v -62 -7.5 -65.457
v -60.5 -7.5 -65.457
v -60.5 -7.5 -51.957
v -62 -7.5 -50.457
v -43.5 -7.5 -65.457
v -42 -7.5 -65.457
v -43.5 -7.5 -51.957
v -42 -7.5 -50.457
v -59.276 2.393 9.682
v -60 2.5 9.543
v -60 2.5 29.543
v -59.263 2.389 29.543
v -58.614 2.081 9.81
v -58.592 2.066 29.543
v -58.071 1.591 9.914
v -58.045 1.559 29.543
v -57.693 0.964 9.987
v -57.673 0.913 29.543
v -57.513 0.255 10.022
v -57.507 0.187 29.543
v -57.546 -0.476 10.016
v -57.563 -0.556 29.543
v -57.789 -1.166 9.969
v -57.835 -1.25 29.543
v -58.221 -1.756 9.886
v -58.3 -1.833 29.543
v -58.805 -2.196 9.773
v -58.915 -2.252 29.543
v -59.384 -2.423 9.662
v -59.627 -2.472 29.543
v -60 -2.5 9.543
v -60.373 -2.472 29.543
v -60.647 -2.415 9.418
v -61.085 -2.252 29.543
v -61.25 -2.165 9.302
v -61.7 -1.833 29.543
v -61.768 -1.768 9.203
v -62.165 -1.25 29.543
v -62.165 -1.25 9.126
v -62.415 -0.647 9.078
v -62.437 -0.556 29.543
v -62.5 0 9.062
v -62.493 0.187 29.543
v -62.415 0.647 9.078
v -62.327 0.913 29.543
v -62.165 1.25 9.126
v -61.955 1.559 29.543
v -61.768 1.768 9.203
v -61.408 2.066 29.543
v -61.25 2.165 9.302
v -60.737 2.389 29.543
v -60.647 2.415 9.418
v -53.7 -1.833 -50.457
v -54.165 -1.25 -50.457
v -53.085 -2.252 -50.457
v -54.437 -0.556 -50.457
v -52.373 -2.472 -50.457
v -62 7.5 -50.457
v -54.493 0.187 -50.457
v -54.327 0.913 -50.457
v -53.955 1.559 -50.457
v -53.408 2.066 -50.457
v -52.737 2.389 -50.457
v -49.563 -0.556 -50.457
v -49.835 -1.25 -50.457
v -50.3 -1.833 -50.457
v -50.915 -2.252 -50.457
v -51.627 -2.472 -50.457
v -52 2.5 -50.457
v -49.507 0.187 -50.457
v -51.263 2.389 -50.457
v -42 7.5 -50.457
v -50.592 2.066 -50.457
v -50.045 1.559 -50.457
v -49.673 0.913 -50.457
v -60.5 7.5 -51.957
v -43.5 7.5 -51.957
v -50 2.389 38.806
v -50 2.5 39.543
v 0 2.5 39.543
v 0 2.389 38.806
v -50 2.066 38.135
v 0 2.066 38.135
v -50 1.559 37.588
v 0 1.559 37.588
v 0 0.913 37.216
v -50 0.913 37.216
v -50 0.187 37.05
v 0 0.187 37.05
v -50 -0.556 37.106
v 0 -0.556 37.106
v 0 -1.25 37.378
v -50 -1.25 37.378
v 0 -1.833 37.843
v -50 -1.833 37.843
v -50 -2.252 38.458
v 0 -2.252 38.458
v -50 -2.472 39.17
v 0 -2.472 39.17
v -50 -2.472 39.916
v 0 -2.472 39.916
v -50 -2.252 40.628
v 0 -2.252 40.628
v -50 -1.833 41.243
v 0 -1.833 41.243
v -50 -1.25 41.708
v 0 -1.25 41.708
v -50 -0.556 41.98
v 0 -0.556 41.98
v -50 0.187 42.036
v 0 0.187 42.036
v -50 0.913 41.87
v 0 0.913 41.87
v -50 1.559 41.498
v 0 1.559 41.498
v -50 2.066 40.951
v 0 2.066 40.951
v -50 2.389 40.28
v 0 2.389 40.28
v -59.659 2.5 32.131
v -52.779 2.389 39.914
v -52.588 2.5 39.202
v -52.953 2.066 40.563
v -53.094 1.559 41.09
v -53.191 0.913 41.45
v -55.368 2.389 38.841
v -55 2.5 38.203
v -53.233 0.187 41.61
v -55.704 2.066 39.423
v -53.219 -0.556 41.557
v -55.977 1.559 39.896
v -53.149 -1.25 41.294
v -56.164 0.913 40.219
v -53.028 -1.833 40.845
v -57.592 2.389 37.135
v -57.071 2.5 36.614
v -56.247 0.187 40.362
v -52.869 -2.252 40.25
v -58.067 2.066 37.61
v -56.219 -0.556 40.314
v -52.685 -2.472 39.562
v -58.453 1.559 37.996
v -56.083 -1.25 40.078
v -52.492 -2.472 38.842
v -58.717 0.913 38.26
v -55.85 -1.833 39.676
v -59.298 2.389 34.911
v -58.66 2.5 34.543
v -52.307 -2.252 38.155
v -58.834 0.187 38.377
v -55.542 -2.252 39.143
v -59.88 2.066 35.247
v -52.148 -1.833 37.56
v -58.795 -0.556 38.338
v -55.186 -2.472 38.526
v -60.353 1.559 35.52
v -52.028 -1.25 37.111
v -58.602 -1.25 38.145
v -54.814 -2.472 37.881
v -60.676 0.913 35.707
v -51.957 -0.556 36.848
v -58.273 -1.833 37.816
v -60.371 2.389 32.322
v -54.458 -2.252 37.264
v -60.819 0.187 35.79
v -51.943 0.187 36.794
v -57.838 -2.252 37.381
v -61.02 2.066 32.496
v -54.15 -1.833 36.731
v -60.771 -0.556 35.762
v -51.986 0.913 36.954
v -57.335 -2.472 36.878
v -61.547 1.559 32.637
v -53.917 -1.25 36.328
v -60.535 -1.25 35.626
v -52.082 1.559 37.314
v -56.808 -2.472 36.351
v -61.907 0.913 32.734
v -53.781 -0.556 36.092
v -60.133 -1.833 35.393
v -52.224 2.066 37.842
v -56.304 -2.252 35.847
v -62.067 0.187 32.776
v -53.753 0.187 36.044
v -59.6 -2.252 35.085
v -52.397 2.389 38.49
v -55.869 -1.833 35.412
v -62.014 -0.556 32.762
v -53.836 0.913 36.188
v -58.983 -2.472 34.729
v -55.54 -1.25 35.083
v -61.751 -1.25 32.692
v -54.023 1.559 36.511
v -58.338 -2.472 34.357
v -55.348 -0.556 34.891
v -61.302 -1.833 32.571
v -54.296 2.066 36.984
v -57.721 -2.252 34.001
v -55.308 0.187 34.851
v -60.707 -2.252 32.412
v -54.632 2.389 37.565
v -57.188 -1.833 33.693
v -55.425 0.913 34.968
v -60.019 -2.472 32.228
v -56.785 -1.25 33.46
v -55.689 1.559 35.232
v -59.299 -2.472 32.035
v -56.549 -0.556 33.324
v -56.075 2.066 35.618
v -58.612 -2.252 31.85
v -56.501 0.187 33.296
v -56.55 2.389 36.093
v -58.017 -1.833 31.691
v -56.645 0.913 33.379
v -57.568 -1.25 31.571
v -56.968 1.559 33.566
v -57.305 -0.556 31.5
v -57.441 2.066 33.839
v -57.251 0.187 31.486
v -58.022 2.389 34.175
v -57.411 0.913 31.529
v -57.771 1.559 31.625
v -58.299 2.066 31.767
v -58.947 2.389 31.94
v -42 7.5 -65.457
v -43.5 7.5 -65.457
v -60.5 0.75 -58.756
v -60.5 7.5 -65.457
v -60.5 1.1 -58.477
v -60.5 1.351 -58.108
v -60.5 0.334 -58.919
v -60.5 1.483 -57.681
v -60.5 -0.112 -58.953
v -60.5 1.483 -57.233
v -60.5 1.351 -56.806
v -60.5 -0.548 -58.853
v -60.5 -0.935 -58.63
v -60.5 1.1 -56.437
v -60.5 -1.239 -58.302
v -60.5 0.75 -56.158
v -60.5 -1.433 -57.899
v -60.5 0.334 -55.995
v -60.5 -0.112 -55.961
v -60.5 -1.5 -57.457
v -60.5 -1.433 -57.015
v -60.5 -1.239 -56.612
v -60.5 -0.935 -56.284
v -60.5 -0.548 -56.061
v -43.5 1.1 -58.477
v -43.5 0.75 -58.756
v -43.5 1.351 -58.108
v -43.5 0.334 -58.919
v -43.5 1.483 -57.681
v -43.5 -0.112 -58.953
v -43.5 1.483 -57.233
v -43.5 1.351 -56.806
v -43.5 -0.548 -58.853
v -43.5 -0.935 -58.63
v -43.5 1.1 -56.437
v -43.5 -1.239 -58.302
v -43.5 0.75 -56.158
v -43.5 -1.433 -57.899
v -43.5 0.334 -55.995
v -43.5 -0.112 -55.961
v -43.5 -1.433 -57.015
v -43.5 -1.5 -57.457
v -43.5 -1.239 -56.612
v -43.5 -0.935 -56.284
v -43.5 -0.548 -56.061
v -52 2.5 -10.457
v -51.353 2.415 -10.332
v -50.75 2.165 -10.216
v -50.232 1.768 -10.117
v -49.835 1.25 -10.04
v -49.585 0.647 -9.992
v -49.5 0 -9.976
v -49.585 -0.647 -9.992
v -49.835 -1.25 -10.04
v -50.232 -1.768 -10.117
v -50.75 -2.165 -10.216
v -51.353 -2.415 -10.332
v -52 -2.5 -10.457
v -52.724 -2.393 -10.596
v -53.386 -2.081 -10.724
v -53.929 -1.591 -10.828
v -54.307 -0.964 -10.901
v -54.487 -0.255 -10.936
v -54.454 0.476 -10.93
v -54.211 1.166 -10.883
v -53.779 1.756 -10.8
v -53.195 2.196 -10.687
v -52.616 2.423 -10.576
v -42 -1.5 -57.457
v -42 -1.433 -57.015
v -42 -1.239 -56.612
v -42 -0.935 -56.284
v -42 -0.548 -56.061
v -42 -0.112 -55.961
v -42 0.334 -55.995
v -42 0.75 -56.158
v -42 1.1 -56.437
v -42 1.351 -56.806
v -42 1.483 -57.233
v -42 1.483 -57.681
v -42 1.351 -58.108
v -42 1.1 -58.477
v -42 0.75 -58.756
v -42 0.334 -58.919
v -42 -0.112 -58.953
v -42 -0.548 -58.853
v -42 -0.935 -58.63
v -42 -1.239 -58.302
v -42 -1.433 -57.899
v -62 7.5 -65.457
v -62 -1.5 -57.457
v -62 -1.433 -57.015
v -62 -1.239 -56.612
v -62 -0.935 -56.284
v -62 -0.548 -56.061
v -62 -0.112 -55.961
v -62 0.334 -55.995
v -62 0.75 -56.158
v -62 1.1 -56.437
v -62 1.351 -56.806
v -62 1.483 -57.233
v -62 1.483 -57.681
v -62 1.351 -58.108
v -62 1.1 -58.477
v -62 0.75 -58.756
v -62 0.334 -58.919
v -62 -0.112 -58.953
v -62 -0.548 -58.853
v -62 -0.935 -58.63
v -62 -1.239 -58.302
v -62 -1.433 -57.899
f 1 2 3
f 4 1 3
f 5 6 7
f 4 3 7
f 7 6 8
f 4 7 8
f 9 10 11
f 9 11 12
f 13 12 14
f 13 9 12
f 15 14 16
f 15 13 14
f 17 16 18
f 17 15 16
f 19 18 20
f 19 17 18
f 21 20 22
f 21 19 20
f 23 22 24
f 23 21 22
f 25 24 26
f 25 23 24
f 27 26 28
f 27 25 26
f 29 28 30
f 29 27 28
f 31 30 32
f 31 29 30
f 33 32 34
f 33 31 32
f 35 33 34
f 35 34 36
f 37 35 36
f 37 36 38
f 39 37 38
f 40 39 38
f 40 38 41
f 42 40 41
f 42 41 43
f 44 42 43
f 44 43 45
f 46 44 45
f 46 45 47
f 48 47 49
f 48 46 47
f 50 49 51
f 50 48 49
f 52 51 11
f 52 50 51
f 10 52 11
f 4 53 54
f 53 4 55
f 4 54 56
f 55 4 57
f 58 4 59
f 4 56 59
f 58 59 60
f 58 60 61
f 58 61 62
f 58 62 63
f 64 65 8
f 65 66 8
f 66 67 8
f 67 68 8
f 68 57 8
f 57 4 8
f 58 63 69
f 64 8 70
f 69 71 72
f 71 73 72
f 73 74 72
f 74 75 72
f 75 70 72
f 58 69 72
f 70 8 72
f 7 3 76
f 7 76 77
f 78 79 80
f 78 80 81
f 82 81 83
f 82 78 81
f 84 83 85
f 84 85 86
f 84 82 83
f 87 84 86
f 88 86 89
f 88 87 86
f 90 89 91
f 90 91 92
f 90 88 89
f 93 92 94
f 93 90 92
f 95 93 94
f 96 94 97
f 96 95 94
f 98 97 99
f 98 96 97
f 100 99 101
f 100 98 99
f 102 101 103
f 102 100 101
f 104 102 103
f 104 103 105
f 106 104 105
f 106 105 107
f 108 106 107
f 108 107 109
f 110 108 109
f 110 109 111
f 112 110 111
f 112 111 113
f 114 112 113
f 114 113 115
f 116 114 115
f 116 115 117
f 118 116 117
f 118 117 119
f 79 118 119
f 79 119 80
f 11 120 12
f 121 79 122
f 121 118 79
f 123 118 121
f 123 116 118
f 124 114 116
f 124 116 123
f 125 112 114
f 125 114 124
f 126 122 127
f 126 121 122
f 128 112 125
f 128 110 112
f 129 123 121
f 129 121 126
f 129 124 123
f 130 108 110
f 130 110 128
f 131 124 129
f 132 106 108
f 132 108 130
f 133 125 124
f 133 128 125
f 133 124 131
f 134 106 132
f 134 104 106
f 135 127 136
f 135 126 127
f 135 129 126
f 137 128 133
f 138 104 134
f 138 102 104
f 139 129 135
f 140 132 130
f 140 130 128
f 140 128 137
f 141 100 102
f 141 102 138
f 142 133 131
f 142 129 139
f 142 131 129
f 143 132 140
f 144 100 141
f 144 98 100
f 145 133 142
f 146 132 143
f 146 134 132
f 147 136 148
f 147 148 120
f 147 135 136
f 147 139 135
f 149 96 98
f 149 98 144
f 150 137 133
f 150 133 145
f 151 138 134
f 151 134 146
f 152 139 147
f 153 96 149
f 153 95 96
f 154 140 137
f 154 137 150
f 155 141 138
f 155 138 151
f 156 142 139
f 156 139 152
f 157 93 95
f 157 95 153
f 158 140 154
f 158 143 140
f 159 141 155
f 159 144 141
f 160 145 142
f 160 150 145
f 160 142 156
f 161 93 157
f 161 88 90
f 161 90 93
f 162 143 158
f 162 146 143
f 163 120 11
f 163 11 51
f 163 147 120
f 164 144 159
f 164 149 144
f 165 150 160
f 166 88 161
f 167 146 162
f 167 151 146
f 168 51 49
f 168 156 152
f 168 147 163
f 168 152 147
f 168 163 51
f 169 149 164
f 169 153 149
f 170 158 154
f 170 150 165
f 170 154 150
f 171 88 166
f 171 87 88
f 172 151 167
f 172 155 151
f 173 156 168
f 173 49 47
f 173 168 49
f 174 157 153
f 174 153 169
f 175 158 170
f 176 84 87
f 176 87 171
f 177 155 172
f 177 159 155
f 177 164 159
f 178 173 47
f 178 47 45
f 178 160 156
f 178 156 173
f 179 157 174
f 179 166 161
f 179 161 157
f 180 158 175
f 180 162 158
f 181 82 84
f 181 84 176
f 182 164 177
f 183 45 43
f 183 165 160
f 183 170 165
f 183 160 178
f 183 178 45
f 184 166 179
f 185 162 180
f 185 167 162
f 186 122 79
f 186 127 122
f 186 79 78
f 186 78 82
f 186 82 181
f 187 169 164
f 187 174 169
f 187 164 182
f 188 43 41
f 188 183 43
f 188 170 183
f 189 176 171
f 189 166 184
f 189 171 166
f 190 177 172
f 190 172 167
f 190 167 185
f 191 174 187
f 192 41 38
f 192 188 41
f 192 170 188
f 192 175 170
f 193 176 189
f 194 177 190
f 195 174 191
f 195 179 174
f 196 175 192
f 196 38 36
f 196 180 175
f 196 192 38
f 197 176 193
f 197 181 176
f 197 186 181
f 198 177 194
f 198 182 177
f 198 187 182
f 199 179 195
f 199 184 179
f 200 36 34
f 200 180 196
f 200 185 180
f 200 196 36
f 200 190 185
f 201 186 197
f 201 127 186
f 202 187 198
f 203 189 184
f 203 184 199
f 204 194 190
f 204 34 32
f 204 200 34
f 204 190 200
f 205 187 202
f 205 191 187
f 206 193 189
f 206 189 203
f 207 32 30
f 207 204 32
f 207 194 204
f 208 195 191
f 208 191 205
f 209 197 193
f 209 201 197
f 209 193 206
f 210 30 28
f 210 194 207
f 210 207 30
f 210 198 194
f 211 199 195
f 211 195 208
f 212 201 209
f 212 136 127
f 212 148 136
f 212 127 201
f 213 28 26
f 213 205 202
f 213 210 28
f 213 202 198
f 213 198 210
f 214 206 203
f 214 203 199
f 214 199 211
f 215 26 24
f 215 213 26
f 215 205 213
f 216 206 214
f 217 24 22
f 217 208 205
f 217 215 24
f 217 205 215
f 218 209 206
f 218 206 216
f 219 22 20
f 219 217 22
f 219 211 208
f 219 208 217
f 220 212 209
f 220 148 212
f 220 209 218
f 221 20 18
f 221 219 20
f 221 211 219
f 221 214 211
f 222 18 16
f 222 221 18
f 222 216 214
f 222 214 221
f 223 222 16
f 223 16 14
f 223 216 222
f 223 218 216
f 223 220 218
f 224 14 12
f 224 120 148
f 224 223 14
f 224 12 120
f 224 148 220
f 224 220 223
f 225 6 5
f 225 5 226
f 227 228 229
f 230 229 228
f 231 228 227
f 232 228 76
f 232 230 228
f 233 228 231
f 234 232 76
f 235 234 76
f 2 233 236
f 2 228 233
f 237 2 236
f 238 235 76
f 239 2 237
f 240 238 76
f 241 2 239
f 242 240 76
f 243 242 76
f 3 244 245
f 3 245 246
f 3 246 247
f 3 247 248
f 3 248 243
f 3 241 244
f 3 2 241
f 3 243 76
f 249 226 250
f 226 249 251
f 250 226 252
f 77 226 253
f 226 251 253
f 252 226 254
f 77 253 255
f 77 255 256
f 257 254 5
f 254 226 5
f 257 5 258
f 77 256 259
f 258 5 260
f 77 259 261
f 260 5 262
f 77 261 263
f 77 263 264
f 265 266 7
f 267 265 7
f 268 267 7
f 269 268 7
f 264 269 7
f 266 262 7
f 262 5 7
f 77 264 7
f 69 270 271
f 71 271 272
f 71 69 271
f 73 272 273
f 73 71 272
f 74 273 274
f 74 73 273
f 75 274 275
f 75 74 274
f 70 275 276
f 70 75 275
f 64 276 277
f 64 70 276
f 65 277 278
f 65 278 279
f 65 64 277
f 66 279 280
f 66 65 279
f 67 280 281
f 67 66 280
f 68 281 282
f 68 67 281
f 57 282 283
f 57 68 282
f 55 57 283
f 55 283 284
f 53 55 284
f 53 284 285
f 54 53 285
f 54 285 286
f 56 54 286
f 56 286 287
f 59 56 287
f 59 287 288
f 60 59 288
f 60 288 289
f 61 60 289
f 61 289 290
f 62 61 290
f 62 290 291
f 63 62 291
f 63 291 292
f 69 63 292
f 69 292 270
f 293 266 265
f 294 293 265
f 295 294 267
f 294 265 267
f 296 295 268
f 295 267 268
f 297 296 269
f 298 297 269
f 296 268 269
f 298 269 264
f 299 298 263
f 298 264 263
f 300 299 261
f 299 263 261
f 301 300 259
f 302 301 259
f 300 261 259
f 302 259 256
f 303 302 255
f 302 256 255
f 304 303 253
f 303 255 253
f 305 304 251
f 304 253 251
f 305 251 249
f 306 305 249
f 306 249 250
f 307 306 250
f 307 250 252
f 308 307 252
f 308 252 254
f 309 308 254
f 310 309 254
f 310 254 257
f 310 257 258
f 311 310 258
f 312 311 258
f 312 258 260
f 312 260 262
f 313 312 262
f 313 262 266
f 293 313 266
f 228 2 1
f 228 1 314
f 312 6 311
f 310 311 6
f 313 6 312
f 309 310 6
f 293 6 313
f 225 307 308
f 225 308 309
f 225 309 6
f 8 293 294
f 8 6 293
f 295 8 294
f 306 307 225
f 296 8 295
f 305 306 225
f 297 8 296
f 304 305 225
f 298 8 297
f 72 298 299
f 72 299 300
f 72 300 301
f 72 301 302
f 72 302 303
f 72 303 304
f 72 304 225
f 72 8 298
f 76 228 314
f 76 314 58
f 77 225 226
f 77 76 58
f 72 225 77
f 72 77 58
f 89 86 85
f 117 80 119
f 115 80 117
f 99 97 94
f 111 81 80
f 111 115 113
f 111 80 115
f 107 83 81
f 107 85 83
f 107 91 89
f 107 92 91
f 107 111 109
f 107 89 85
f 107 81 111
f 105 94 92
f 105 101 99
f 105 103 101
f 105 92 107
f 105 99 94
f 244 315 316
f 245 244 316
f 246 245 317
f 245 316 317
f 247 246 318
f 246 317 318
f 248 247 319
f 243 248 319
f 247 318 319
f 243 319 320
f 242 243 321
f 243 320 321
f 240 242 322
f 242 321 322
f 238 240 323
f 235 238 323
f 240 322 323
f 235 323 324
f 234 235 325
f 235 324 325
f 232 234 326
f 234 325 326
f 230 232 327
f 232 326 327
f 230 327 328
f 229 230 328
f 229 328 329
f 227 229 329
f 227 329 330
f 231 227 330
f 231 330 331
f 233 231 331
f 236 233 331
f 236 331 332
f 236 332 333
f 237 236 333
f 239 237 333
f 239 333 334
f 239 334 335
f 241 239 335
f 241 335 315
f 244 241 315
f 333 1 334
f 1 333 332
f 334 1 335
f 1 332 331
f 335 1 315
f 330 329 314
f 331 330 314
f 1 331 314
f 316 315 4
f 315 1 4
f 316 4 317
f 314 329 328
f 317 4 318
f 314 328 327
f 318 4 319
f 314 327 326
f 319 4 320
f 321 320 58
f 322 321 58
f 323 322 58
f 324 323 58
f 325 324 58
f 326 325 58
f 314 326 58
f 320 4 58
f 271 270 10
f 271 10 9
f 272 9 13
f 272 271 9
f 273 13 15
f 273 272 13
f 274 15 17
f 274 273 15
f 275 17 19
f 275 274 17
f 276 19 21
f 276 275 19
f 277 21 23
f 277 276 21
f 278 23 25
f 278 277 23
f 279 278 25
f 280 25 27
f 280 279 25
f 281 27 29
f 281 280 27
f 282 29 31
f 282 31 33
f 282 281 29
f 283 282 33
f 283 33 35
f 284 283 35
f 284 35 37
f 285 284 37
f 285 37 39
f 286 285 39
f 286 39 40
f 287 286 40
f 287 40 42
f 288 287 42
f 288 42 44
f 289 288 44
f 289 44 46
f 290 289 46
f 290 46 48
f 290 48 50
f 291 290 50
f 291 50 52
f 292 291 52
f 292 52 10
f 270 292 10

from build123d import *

# Parameters (mm, degrees)
F1_R     = 2.5
F4_W     = 15
F4_H     = 15
F5_DEPTH = 10
F6_W     = 17
F6_H     = 13.5
F7_DEPTH = 25
F8_R     = 1.5
F9_DEPTH = 25


with BuildPart() as f2:
    # F2: sweep along a path in F0
    with BuildLine(Plane.XZ) as f2_path:
        Line((0, 39.5429997165), (-50, 39.5429997165))
        ThreePointArc((-50, 39.5429997165), (-57.0710678119, 36.6140675284), (-60, 29.5429997165))
        Line((-60, 29.5429997165), (-60, 9.5429997165))
        Line((-60, 9.5429997165), (-52, -10.4570002835))
        Line((-52, -10.4570002835), (-52, -50.4570002835))
    # F1 (on Right) → F2 (sweep)
    with BuildSketch(Plane.YZ):
        with Locations((0, 39.5429997165)):
            Circle(F1_R)
    sweep(path=f2_path.line, transition=Transition.RIGHT)

    # F4 (on offset) → F5 (join, symmetric)
    with BuildSketch(Plane.YZ.offset(-52)):
        with Locations((0, -57.9570002835)):
            Rectangle(F4_W, F4_H)
    extrude(amount=F5_DEPTH, both=True)

    # F6 (on face) → F7 (cut)
    with BuildSketch(Plane.XZ.offset(7.5)):
        with Locations((-52, -58.7070002835)):
            Rectangle(F6_W, F6_H)
    extrude(amount=-F7_DEPTH, mode=Mode.SUBTRACT)

    # F8 (on face) → F9 (cut)
    with BuildSketch(Plane(origin=(-62, 0, 0), x_dir=(0, -1, 0), z_dir=(-1, 0, 0))):
        with Locations((0, -57.4570002835)):
            Circle(F8_R)
    extrude(amount=-F9_DEPTH, mode=Mode.SUBTRACT)


solid = f2.part
